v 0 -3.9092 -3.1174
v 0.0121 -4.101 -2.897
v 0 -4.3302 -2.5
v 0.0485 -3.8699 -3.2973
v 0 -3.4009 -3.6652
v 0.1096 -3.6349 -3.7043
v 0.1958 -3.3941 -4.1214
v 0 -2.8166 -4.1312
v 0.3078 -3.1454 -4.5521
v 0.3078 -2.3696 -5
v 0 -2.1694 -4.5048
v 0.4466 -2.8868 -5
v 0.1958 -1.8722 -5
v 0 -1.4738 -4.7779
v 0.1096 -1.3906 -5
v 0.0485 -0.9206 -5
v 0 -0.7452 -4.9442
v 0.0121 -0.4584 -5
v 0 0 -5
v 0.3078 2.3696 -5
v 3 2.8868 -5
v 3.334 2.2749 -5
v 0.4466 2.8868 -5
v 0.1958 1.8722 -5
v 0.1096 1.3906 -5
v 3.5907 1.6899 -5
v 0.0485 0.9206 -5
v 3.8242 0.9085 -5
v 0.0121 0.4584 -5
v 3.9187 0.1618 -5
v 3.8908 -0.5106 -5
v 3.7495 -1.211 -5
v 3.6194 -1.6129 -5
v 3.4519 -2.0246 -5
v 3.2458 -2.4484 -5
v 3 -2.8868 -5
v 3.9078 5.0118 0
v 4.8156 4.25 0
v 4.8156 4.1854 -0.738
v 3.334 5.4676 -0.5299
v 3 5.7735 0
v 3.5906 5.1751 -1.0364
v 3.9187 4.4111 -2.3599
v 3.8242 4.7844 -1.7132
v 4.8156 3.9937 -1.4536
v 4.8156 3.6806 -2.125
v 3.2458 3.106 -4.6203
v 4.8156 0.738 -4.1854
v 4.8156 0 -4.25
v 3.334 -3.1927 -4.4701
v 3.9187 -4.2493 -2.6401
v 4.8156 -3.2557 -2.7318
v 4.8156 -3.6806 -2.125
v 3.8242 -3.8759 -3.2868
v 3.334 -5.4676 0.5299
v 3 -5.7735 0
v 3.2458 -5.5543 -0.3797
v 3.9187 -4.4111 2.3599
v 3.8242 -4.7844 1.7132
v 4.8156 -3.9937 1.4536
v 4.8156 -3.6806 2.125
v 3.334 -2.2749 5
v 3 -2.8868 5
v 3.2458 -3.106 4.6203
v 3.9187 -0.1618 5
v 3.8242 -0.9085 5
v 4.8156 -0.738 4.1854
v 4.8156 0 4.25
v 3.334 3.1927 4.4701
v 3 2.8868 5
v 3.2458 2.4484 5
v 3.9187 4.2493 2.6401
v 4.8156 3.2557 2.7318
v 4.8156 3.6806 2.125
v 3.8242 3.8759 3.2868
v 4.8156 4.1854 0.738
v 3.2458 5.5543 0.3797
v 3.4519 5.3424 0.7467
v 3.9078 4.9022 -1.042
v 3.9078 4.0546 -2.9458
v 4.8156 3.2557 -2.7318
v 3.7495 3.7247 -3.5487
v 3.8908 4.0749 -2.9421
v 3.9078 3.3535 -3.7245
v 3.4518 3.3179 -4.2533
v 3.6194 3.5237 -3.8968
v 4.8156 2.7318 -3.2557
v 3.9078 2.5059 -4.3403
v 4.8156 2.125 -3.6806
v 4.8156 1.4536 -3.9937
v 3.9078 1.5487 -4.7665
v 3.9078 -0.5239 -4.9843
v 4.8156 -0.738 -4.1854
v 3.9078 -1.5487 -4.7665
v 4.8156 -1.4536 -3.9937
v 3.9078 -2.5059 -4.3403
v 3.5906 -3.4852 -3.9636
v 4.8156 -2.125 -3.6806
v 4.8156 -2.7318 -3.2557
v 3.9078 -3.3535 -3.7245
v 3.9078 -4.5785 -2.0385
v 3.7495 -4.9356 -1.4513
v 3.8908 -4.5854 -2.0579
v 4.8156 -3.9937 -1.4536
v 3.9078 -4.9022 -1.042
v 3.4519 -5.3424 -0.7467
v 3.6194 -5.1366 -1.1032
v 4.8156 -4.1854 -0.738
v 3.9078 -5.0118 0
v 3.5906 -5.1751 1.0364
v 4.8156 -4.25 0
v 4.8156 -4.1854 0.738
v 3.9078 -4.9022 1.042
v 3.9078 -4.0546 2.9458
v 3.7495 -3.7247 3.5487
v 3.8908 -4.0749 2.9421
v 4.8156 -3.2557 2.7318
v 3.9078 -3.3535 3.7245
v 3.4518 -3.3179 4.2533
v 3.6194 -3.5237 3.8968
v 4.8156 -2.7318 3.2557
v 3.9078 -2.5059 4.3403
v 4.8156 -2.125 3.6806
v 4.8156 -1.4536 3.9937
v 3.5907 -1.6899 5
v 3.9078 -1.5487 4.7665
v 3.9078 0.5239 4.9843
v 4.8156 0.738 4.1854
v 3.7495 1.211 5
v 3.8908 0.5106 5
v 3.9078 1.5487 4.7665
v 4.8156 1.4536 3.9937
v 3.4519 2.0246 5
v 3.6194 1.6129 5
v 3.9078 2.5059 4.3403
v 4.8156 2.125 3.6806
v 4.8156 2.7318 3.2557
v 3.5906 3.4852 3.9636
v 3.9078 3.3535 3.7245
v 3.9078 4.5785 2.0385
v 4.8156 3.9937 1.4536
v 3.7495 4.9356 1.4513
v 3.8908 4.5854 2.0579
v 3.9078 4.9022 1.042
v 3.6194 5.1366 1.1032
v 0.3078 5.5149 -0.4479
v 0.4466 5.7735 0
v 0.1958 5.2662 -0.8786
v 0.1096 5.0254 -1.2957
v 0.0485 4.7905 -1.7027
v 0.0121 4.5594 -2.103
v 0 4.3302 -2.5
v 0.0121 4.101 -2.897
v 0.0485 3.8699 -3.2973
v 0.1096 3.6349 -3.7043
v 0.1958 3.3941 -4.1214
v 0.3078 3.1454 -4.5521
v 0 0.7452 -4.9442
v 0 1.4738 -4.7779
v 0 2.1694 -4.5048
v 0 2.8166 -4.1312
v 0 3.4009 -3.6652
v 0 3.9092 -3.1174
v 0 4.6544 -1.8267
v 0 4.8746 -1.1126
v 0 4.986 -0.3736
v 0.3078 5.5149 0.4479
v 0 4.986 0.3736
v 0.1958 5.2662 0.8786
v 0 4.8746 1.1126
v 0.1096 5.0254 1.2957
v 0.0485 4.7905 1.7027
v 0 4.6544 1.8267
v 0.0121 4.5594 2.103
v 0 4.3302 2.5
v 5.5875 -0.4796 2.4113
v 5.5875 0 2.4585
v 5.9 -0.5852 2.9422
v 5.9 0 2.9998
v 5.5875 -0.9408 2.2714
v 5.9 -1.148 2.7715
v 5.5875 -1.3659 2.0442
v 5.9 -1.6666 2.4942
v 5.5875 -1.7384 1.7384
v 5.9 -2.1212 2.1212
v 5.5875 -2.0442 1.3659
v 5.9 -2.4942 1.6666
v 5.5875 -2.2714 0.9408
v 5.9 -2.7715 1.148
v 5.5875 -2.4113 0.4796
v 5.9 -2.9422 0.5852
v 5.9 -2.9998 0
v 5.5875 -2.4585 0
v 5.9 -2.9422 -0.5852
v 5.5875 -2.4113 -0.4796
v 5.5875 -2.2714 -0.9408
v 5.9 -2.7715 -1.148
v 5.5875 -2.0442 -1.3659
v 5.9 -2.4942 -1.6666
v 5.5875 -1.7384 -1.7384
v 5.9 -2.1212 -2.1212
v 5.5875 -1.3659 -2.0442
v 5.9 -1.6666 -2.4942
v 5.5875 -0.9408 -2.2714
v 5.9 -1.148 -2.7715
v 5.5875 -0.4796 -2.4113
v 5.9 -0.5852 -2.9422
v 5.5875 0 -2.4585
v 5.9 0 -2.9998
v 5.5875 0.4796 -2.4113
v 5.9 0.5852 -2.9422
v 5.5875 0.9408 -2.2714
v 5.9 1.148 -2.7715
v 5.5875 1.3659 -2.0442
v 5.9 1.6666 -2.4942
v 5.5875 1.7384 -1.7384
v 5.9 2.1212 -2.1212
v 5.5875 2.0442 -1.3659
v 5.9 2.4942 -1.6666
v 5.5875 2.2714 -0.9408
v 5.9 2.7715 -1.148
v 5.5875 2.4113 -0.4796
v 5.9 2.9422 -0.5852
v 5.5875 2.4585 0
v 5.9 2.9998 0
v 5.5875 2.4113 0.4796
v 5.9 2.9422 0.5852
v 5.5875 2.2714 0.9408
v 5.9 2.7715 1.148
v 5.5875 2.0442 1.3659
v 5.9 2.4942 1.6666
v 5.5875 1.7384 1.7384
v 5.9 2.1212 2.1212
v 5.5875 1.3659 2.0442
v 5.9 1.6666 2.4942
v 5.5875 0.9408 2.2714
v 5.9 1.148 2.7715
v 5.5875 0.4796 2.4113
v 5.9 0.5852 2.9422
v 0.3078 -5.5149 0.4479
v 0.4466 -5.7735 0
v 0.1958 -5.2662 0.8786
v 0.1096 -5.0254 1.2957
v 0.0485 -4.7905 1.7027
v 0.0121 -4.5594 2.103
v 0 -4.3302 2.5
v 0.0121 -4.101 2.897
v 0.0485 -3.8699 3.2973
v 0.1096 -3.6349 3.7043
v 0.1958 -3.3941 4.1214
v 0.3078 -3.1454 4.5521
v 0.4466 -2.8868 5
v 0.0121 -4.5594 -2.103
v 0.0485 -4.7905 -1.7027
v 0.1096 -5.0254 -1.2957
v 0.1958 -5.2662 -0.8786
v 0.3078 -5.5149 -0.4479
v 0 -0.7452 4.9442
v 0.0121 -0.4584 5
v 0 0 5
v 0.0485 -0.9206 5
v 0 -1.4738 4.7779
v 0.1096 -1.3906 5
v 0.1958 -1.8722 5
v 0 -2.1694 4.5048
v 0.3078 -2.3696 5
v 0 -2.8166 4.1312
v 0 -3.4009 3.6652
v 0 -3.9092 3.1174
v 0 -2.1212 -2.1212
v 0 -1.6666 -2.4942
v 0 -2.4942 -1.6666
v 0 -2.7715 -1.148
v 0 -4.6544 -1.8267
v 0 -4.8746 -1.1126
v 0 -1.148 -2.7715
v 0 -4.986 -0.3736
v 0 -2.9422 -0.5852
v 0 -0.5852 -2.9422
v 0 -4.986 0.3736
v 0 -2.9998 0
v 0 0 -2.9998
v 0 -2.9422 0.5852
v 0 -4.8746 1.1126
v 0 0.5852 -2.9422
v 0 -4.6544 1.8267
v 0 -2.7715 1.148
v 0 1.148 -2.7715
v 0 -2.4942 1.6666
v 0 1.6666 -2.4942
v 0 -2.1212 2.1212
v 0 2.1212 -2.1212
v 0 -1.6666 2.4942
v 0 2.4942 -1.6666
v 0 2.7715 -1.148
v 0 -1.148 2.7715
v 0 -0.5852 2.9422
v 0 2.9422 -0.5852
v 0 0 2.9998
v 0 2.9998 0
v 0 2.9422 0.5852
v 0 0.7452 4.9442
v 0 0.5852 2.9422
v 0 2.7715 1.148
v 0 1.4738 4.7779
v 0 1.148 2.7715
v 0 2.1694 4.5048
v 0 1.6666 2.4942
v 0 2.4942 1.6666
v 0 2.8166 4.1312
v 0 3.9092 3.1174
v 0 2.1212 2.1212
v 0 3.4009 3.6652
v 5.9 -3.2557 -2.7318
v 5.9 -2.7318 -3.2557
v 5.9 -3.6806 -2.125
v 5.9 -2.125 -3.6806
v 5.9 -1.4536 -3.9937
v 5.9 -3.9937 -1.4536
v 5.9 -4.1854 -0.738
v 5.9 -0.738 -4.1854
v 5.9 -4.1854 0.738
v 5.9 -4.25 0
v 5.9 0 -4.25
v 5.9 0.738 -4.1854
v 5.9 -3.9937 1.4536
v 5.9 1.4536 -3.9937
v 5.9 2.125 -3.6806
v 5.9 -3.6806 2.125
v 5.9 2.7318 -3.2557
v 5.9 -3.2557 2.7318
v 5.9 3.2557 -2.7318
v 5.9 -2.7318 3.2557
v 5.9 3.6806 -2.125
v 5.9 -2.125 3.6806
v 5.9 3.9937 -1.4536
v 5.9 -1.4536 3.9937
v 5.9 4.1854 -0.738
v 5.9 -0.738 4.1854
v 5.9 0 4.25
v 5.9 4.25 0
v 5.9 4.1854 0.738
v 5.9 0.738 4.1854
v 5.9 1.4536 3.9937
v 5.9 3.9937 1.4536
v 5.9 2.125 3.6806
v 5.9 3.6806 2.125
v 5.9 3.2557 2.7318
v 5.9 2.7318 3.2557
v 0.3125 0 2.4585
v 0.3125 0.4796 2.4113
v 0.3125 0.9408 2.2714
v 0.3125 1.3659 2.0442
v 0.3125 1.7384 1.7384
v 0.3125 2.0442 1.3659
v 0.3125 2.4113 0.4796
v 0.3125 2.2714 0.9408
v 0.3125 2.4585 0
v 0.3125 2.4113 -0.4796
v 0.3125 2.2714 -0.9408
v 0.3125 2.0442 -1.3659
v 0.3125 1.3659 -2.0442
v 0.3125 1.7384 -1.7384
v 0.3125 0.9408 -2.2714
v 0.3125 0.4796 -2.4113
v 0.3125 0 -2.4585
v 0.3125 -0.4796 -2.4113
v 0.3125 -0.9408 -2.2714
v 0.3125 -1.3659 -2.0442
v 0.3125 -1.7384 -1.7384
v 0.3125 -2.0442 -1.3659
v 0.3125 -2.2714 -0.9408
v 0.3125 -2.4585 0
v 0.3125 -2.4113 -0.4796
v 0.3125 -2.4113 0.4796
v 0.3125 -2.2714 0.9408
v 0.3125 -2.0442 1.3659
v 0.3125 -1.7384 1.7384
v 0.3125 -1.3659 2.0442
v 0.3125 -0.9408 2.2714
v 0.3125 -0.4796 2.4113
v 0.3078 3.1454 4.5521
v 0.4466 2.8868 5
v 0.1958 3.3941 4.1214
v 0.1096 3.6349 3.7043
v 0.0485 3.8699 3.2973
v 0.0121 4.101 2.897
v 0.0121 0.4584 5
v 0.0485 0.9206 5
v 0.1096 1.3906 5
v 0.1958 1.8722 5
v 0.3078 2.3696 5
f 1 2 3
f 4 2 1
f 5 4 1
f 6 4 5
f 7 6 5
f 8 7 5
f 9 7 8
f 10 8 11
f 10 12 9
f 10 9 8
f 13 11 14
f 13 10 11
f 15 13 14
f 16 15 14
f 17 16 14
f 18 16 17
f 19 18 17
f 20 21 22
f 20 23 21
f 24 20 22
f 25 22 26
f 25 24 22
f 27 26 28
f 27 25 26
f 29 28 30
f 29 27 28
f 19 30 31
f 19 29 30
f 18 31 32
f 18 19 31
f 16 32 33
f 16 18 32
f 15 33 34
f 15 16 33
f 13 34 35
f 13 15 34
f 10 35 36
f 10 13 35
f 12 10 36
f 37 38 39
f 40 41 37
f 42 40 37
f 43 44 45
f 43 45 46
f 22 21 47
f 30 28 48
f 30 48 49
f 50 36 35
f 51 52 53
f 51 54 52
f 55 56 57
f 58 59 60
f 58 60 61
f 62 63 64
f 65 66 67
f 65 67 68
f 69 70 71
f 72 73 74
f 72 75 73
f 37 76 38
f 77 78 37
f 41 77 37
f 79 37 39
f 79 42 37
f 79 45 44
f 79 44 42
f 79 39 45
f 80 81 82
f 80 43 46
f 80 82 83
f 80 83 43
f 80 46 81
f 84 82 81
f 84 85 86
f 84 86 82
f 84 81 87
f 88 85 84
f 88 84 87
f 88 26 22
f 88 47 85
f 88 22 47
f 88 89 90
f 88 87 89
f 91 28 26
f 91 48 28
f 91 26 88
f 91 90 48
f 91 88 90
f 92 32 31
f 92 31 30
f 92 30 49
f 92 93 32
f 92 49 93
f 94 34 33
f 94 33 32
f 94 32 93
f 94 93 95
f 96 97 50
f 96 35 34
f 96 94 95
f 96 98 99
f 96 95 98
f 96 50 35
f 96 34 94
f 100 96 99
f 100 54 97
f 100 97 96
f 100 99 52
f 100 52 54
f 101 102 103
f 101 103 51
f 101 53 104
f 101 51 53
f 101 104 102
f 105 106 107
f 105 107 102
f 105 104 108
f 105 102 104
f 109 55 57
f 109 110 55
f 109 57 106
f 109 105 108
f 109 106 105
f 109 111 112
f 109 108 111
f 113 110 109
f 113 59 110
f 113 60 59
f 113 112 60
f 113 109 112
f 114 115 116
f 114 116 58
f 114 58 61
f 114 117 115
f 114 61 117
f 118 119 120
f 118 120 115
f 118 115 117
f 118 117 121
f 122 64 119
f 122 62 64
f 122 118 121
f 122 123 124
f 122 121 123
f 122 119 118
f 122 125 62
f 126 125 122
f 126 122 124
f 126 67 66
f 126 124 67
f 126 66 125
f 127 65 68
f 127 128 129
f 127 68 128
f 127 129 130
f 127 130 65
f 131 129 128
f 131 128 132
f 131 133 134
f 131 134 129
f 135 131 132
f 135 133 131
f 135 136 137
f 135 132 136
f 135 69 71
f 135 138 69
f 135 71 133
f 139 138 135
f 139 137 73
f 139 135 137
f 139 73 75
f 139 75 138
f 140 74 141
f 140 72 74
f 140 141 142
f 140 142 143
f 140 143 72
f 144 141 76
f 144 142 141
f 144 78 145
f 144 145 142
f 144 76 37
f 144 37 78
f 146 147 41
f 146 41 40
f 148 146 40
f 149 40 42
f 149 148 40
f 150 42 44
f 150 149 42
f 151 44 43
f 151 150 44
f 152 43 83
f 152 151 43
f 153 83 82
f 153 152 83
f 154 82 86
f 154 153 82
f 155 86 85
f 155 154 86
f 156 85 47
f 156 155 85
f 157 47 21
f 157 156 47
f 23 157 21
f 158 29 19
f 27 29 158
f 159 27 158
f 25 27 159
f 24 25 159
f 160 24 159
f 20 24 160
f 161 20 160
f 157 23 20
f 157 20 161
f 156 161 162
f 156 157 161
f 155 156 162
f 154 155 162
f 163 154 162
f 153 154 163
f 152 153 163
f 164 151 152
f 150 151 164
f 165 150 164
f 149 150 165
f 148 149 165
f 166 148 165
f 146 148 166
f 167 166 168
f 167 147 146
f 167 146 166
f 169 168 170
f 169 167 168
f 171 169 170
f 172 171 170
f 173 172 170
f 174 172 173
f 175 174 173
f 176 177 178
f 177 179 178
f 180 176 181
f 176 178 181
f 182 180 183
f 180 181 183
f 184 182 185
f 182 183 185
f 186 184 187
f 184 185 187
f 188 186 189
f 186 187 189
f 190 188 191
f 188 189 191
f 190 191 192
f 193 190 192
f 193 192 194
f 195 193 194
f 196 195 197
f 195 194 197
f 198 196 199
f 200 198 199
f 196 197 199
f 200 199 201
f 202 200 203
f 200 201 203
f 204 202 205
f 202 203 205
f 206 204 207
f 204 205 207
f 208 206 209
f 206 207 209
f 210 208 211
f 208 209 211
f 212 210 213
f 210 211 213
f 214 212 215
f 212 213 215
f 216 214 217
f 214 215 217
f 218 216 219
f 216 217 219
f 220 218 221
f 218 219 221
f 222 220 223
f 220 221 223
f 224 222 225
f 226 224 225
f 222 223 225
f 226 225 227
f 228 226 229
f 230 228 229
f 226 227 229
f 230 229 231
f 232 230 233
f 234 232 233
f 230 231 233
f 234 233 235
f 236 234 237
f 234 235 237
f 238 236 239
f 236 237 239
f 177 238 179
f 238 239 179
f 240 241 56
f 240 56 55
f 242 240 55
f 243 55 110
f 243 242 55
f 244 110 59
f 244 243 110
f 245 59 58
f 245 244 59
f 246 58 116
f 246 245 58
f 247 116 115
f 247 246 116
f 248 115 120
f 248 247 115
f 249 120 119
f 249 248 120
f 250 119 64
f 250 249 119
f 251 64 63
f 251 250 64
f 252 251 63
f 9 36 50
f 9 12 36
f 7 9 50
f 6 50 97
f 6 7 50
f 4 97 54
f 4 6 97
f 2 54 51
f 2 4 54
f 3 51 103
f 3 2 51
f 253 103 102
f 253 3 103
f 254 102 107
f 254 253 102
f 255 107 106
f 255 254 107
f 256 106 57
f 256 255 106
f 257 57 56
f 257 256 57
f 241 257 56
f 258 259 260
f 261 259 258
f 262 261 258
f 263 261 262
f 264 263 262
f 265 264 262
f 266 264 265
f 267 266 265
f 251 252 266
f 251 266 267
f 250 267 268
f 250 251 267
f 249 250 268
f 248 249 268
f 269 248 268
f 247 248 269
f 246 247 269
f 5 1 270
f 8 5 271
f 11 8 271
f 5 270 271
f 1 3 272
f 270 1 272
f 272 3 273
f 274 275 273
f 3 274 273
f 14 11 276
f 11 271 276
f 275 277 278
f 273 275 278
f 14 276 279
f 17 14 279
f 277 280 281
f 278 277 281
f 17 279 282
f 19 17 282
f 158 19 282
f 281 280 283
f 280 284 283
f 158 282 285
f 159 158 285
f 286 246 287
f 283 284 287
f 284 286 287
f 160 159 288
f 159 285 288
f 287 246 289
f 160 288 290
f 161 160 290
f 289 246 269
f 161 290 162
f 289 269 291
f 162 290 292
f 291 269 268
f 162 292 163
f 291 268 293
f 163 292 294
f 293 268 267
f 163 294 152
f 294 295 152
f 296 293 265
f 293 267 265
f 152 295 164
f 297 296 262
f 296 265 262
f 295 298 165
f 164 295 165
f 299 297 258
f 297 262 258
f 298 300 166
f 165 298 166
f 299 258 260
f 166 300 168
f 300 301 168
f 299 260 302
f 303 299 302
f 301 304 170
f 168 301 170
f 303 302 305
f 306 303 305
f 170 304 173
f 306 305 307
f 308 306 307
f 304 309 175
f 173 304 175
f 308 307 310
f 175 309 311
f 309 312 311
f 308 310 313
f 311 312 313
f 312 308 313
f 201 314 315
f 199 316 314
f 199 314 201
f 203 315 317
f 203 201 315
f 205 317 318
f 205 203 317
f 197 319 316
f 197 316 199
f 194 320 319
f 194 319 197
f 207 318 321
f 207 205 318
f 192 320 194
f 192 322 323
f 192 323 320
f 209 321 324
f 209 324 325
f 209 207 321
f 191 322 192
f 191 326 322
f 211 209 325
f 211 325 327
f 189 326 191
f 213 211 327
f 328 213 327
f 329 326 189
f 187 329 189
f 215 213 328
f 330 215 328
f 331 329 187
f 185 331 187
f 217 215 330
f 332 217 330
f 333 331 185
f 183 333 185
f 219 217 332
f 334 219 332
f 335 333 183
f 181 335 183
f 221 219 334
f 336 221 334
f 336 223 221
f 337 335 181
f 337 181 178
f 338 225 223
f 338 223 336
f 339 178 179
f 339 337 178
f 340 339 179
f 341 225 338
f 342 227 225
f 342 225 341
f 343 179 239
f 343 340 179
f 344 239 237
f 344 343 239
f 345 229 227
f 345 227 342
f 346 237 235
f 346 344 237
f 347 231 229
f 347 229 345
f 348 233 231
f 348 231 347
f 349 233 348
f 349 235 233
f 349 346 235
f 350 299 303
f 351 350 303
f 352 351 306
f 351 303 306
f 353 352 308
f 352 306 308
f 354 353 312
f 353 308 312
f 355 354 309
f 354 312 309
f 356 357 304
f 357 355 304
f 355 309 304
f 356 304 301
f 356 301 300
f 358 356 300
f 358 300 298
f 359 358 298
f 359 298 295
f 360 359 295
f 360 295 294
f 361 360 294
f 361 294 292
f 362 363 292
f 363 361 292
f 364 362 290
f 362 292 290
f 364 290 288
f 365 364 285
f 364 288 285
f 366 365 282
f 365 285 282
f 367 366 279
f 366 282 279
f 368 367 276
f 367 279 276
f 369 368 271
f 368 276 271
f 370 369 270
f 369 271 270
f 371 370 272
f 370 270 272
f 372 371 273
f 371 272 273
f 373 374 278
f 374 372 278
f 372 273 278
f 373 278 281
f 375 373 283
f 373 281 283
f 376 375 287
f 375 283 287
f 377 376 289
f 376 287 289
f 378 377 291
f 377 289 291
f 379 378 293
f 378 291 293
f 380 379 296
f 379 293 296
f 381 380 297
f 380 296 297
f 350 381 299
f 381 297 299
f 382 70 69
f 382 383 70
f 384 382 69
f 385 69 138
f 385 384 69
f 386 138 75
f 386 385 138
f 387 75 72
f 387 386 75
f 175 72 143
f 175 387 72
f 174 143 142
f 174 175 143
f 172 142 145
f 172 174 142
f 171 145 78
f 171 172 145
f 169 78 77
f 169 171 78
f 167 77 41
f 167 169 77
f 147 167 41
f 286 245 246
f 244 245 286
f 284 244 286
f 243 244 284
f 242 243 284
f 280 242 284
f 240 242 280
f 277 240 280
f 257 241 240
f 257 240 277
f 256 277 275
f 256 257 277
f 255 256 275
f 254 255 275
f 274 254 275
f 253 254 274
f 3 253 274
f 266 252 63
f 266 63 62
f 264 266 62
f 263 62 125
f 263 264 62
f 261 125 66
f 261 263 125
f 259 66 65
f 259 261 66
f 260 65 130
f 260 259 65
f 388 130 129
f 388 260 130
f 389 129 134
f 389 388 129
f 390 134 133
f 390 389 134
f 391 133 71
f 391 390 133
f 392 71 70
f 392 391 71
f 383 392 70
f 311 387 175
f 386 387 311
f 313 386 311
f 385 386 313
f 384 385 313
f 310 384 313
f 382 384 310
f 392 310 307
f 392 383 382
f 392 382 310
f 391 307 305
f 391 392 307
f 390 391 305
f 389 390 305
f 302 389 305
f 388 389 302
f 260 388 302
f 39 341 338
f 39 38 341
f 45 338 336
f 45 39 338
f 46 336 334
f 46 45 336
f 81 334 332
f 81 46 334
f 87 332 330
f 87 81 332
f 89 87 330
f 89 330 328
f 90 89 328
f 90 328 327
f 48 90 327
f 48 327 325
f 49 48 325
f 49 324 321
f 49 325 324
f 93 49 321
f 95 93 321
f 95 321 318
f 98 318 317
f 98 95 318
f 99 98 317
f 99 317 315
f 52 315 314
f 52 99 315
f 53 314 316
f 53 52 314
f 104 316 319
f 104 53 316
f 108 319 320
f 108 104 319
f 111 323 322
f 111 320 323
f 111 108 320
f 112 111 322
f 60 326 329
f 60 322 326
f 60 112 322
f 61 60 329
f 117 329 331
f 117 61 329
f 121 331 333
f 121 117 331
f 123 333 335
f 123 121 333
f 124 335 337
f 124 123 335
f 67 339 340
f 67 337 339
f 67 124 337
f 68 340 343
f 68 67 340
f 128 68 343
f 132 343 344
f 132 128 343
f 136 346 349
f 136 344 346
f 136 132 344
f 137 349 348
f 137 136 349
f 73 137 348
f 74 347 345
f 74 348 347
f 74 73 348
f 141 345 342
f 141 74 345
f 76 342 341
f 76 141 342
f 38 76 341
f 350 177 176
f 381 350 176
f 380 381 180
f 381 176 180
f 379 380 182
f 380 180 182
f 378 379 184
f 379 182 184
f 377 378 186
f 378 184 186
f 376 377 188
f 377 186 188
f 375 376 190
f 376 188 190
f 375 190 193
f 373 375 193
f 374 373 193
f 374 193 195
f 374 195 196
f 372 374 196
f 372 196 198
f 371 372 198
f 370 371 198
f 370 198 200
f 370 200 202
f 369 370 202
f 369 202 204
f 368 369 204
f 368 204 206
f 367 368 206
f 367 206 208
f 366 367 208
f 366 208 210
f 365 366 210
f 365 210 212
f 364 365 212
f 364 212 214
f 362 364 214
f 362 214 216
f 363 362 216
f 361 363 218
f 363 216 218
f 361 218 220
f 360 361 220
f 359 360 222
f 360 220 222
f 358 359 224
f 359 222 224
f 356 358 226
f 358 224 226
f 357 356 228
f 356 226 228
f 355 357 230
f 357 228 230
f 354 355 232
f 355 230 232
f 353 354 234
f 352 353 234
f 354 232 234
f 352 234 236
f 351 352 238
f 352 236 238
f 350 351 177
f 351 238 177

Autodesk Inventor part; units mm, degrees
ref_plane "YZ Plane" through (0, 0, 0) normal (1, 0, 0) x (0, 1, 0)
ref_plane "XZ Plane" through (0, 0, 0) normal (0, 1, 0) x (-1, 0, 0)
sketch "Sketch1" plane through (0, 0, 0) normal (1, 0, 0) x (0, 1, 0)
  line L0 (-5.7735, 0) -> (-2.8868, 5)
  line L1 (-2.8868, 5) -> (2.8868, 5)
  line L2 (2.8868, 5) -> (5.7735, 0)
  line L3 (5.7735, 0) -> (2.8868, -5)
  line L4 (2.8868, -5) -> (-2.8868, -5)
  line L5 (-2.8868, -5) -> (-5.7735, 0)
  point P0 (0, 0)
  point P1 (0, 0)
  dimension "d0" = 11.547
extrude "Body" add sketch "Sketch1" along normal blind 5.9
sketch "Sketch2" plane through (0, 0, 0) normal (-1, 0, 0) x (0, 0, 1)
  line L0 (0, -8.0829) -> (0, 8.0829) projected
  line L1 (-7, 0) -> (7, 0) projected
  point P0 (0, 0)
hole "Thread" at (0, 0, 0) direction (1, 0, 0) diameter 4.917 end through all thread size "M6x1" class "6H" standard "ANSI Metric M Profile"
chamfer "Chamfer1" distance 0.5413 angle 30 1 edges at (0, 0, -2.4585) measured on face at (0, -3.5612, -2.1322)
chamfer "Chamfer2" distance 0.5413 angle 30 1 edges at (5.9, 0, -2.4585) measured on face at (5.9, -3.5612, -2.1322)
sketch "Sketch3" plane through (0, 0, 0) normal (0, 0, 1) x (1, 0, 0)
  line L0 (0, 2.8868) -> (0, 5.7735) projected
  line L1 (0, 5.7735) -> (5.9, 5.7735) projected
  line L2 (5.9, 2.8868) -> (5.9, 5.7735) projected
  line L3 (-1.18, 0) -> (7.08, 0) projected
  line L4 (0.4466, 5.7735) -> (0, 5)
  line L5 (5.9, 4.25) -> (4.8156, 4.25)
  line L6 (4.8156, 4.25) -> (3, 5.7735)
  dimension "d3" = 30
  dimension "d5" = 10
  dimension "d6" = 8.5
  dimension "d8" = 50
  dimension "d9" = 3
revolve "Chamfer3" cut sketch "Sketch3" angle 360 about axis through (-10, 0, 0) along (1, 0, 0)
ref_plane "Work Plane1" through (16.3751, 0, 0) normal (0, 0, 1) x (-1, 0, 0)
equation "\"d0\" = 1.1547 * SW"
equation "\"d1\" = KOH"
equation "\"d3\" = ANG1"
equation "\"d5\" = SW0"
equation "\"d6\" = SW1"
equation "\"d8\" = ANG2"
equation "\"d9\" = KOH1"
equation "\"d10\" = -0.5 * GD1 + 0.5 * NND"
equation "\"d39\" = -0.5 * GD1 + 0.5 * NND"
equation "\"d12\" = -0.5 * GD1 + 0.5 * NND"
equation "\"d40\" = -0.5 * GD1 + 0.5 * NND"
equation "\"ANG1\" = 30deg"
equation "\"ANG2\" = 50deg"
equation "\"NND\" = 6"
equation "\"KOH\" = 5.9"
equation "\"SW0\" = SW"
equation "\"SW1\" = 0.85 * SW"
equation "\"KOH1\" = 3"
equation "\"GUL\" = 0.541266 * PTC"
equation "\"THREADDIA\" = 6"
equation "\"TOA\" = 30deg"
equation "\"PTC\" = 1"
equation "\"E0\" = 1.155 * SW"
equation "\"GAL\" = 0.541266 * PTC"
equation "\"SW\" = 10"
equation "\"GD1\" = 4.917468"
properties part number "ANSI B18.16.3M - Property Class 5 and 10 - Metric M6 x 1 Metal Type" material "Steel, Mild"
